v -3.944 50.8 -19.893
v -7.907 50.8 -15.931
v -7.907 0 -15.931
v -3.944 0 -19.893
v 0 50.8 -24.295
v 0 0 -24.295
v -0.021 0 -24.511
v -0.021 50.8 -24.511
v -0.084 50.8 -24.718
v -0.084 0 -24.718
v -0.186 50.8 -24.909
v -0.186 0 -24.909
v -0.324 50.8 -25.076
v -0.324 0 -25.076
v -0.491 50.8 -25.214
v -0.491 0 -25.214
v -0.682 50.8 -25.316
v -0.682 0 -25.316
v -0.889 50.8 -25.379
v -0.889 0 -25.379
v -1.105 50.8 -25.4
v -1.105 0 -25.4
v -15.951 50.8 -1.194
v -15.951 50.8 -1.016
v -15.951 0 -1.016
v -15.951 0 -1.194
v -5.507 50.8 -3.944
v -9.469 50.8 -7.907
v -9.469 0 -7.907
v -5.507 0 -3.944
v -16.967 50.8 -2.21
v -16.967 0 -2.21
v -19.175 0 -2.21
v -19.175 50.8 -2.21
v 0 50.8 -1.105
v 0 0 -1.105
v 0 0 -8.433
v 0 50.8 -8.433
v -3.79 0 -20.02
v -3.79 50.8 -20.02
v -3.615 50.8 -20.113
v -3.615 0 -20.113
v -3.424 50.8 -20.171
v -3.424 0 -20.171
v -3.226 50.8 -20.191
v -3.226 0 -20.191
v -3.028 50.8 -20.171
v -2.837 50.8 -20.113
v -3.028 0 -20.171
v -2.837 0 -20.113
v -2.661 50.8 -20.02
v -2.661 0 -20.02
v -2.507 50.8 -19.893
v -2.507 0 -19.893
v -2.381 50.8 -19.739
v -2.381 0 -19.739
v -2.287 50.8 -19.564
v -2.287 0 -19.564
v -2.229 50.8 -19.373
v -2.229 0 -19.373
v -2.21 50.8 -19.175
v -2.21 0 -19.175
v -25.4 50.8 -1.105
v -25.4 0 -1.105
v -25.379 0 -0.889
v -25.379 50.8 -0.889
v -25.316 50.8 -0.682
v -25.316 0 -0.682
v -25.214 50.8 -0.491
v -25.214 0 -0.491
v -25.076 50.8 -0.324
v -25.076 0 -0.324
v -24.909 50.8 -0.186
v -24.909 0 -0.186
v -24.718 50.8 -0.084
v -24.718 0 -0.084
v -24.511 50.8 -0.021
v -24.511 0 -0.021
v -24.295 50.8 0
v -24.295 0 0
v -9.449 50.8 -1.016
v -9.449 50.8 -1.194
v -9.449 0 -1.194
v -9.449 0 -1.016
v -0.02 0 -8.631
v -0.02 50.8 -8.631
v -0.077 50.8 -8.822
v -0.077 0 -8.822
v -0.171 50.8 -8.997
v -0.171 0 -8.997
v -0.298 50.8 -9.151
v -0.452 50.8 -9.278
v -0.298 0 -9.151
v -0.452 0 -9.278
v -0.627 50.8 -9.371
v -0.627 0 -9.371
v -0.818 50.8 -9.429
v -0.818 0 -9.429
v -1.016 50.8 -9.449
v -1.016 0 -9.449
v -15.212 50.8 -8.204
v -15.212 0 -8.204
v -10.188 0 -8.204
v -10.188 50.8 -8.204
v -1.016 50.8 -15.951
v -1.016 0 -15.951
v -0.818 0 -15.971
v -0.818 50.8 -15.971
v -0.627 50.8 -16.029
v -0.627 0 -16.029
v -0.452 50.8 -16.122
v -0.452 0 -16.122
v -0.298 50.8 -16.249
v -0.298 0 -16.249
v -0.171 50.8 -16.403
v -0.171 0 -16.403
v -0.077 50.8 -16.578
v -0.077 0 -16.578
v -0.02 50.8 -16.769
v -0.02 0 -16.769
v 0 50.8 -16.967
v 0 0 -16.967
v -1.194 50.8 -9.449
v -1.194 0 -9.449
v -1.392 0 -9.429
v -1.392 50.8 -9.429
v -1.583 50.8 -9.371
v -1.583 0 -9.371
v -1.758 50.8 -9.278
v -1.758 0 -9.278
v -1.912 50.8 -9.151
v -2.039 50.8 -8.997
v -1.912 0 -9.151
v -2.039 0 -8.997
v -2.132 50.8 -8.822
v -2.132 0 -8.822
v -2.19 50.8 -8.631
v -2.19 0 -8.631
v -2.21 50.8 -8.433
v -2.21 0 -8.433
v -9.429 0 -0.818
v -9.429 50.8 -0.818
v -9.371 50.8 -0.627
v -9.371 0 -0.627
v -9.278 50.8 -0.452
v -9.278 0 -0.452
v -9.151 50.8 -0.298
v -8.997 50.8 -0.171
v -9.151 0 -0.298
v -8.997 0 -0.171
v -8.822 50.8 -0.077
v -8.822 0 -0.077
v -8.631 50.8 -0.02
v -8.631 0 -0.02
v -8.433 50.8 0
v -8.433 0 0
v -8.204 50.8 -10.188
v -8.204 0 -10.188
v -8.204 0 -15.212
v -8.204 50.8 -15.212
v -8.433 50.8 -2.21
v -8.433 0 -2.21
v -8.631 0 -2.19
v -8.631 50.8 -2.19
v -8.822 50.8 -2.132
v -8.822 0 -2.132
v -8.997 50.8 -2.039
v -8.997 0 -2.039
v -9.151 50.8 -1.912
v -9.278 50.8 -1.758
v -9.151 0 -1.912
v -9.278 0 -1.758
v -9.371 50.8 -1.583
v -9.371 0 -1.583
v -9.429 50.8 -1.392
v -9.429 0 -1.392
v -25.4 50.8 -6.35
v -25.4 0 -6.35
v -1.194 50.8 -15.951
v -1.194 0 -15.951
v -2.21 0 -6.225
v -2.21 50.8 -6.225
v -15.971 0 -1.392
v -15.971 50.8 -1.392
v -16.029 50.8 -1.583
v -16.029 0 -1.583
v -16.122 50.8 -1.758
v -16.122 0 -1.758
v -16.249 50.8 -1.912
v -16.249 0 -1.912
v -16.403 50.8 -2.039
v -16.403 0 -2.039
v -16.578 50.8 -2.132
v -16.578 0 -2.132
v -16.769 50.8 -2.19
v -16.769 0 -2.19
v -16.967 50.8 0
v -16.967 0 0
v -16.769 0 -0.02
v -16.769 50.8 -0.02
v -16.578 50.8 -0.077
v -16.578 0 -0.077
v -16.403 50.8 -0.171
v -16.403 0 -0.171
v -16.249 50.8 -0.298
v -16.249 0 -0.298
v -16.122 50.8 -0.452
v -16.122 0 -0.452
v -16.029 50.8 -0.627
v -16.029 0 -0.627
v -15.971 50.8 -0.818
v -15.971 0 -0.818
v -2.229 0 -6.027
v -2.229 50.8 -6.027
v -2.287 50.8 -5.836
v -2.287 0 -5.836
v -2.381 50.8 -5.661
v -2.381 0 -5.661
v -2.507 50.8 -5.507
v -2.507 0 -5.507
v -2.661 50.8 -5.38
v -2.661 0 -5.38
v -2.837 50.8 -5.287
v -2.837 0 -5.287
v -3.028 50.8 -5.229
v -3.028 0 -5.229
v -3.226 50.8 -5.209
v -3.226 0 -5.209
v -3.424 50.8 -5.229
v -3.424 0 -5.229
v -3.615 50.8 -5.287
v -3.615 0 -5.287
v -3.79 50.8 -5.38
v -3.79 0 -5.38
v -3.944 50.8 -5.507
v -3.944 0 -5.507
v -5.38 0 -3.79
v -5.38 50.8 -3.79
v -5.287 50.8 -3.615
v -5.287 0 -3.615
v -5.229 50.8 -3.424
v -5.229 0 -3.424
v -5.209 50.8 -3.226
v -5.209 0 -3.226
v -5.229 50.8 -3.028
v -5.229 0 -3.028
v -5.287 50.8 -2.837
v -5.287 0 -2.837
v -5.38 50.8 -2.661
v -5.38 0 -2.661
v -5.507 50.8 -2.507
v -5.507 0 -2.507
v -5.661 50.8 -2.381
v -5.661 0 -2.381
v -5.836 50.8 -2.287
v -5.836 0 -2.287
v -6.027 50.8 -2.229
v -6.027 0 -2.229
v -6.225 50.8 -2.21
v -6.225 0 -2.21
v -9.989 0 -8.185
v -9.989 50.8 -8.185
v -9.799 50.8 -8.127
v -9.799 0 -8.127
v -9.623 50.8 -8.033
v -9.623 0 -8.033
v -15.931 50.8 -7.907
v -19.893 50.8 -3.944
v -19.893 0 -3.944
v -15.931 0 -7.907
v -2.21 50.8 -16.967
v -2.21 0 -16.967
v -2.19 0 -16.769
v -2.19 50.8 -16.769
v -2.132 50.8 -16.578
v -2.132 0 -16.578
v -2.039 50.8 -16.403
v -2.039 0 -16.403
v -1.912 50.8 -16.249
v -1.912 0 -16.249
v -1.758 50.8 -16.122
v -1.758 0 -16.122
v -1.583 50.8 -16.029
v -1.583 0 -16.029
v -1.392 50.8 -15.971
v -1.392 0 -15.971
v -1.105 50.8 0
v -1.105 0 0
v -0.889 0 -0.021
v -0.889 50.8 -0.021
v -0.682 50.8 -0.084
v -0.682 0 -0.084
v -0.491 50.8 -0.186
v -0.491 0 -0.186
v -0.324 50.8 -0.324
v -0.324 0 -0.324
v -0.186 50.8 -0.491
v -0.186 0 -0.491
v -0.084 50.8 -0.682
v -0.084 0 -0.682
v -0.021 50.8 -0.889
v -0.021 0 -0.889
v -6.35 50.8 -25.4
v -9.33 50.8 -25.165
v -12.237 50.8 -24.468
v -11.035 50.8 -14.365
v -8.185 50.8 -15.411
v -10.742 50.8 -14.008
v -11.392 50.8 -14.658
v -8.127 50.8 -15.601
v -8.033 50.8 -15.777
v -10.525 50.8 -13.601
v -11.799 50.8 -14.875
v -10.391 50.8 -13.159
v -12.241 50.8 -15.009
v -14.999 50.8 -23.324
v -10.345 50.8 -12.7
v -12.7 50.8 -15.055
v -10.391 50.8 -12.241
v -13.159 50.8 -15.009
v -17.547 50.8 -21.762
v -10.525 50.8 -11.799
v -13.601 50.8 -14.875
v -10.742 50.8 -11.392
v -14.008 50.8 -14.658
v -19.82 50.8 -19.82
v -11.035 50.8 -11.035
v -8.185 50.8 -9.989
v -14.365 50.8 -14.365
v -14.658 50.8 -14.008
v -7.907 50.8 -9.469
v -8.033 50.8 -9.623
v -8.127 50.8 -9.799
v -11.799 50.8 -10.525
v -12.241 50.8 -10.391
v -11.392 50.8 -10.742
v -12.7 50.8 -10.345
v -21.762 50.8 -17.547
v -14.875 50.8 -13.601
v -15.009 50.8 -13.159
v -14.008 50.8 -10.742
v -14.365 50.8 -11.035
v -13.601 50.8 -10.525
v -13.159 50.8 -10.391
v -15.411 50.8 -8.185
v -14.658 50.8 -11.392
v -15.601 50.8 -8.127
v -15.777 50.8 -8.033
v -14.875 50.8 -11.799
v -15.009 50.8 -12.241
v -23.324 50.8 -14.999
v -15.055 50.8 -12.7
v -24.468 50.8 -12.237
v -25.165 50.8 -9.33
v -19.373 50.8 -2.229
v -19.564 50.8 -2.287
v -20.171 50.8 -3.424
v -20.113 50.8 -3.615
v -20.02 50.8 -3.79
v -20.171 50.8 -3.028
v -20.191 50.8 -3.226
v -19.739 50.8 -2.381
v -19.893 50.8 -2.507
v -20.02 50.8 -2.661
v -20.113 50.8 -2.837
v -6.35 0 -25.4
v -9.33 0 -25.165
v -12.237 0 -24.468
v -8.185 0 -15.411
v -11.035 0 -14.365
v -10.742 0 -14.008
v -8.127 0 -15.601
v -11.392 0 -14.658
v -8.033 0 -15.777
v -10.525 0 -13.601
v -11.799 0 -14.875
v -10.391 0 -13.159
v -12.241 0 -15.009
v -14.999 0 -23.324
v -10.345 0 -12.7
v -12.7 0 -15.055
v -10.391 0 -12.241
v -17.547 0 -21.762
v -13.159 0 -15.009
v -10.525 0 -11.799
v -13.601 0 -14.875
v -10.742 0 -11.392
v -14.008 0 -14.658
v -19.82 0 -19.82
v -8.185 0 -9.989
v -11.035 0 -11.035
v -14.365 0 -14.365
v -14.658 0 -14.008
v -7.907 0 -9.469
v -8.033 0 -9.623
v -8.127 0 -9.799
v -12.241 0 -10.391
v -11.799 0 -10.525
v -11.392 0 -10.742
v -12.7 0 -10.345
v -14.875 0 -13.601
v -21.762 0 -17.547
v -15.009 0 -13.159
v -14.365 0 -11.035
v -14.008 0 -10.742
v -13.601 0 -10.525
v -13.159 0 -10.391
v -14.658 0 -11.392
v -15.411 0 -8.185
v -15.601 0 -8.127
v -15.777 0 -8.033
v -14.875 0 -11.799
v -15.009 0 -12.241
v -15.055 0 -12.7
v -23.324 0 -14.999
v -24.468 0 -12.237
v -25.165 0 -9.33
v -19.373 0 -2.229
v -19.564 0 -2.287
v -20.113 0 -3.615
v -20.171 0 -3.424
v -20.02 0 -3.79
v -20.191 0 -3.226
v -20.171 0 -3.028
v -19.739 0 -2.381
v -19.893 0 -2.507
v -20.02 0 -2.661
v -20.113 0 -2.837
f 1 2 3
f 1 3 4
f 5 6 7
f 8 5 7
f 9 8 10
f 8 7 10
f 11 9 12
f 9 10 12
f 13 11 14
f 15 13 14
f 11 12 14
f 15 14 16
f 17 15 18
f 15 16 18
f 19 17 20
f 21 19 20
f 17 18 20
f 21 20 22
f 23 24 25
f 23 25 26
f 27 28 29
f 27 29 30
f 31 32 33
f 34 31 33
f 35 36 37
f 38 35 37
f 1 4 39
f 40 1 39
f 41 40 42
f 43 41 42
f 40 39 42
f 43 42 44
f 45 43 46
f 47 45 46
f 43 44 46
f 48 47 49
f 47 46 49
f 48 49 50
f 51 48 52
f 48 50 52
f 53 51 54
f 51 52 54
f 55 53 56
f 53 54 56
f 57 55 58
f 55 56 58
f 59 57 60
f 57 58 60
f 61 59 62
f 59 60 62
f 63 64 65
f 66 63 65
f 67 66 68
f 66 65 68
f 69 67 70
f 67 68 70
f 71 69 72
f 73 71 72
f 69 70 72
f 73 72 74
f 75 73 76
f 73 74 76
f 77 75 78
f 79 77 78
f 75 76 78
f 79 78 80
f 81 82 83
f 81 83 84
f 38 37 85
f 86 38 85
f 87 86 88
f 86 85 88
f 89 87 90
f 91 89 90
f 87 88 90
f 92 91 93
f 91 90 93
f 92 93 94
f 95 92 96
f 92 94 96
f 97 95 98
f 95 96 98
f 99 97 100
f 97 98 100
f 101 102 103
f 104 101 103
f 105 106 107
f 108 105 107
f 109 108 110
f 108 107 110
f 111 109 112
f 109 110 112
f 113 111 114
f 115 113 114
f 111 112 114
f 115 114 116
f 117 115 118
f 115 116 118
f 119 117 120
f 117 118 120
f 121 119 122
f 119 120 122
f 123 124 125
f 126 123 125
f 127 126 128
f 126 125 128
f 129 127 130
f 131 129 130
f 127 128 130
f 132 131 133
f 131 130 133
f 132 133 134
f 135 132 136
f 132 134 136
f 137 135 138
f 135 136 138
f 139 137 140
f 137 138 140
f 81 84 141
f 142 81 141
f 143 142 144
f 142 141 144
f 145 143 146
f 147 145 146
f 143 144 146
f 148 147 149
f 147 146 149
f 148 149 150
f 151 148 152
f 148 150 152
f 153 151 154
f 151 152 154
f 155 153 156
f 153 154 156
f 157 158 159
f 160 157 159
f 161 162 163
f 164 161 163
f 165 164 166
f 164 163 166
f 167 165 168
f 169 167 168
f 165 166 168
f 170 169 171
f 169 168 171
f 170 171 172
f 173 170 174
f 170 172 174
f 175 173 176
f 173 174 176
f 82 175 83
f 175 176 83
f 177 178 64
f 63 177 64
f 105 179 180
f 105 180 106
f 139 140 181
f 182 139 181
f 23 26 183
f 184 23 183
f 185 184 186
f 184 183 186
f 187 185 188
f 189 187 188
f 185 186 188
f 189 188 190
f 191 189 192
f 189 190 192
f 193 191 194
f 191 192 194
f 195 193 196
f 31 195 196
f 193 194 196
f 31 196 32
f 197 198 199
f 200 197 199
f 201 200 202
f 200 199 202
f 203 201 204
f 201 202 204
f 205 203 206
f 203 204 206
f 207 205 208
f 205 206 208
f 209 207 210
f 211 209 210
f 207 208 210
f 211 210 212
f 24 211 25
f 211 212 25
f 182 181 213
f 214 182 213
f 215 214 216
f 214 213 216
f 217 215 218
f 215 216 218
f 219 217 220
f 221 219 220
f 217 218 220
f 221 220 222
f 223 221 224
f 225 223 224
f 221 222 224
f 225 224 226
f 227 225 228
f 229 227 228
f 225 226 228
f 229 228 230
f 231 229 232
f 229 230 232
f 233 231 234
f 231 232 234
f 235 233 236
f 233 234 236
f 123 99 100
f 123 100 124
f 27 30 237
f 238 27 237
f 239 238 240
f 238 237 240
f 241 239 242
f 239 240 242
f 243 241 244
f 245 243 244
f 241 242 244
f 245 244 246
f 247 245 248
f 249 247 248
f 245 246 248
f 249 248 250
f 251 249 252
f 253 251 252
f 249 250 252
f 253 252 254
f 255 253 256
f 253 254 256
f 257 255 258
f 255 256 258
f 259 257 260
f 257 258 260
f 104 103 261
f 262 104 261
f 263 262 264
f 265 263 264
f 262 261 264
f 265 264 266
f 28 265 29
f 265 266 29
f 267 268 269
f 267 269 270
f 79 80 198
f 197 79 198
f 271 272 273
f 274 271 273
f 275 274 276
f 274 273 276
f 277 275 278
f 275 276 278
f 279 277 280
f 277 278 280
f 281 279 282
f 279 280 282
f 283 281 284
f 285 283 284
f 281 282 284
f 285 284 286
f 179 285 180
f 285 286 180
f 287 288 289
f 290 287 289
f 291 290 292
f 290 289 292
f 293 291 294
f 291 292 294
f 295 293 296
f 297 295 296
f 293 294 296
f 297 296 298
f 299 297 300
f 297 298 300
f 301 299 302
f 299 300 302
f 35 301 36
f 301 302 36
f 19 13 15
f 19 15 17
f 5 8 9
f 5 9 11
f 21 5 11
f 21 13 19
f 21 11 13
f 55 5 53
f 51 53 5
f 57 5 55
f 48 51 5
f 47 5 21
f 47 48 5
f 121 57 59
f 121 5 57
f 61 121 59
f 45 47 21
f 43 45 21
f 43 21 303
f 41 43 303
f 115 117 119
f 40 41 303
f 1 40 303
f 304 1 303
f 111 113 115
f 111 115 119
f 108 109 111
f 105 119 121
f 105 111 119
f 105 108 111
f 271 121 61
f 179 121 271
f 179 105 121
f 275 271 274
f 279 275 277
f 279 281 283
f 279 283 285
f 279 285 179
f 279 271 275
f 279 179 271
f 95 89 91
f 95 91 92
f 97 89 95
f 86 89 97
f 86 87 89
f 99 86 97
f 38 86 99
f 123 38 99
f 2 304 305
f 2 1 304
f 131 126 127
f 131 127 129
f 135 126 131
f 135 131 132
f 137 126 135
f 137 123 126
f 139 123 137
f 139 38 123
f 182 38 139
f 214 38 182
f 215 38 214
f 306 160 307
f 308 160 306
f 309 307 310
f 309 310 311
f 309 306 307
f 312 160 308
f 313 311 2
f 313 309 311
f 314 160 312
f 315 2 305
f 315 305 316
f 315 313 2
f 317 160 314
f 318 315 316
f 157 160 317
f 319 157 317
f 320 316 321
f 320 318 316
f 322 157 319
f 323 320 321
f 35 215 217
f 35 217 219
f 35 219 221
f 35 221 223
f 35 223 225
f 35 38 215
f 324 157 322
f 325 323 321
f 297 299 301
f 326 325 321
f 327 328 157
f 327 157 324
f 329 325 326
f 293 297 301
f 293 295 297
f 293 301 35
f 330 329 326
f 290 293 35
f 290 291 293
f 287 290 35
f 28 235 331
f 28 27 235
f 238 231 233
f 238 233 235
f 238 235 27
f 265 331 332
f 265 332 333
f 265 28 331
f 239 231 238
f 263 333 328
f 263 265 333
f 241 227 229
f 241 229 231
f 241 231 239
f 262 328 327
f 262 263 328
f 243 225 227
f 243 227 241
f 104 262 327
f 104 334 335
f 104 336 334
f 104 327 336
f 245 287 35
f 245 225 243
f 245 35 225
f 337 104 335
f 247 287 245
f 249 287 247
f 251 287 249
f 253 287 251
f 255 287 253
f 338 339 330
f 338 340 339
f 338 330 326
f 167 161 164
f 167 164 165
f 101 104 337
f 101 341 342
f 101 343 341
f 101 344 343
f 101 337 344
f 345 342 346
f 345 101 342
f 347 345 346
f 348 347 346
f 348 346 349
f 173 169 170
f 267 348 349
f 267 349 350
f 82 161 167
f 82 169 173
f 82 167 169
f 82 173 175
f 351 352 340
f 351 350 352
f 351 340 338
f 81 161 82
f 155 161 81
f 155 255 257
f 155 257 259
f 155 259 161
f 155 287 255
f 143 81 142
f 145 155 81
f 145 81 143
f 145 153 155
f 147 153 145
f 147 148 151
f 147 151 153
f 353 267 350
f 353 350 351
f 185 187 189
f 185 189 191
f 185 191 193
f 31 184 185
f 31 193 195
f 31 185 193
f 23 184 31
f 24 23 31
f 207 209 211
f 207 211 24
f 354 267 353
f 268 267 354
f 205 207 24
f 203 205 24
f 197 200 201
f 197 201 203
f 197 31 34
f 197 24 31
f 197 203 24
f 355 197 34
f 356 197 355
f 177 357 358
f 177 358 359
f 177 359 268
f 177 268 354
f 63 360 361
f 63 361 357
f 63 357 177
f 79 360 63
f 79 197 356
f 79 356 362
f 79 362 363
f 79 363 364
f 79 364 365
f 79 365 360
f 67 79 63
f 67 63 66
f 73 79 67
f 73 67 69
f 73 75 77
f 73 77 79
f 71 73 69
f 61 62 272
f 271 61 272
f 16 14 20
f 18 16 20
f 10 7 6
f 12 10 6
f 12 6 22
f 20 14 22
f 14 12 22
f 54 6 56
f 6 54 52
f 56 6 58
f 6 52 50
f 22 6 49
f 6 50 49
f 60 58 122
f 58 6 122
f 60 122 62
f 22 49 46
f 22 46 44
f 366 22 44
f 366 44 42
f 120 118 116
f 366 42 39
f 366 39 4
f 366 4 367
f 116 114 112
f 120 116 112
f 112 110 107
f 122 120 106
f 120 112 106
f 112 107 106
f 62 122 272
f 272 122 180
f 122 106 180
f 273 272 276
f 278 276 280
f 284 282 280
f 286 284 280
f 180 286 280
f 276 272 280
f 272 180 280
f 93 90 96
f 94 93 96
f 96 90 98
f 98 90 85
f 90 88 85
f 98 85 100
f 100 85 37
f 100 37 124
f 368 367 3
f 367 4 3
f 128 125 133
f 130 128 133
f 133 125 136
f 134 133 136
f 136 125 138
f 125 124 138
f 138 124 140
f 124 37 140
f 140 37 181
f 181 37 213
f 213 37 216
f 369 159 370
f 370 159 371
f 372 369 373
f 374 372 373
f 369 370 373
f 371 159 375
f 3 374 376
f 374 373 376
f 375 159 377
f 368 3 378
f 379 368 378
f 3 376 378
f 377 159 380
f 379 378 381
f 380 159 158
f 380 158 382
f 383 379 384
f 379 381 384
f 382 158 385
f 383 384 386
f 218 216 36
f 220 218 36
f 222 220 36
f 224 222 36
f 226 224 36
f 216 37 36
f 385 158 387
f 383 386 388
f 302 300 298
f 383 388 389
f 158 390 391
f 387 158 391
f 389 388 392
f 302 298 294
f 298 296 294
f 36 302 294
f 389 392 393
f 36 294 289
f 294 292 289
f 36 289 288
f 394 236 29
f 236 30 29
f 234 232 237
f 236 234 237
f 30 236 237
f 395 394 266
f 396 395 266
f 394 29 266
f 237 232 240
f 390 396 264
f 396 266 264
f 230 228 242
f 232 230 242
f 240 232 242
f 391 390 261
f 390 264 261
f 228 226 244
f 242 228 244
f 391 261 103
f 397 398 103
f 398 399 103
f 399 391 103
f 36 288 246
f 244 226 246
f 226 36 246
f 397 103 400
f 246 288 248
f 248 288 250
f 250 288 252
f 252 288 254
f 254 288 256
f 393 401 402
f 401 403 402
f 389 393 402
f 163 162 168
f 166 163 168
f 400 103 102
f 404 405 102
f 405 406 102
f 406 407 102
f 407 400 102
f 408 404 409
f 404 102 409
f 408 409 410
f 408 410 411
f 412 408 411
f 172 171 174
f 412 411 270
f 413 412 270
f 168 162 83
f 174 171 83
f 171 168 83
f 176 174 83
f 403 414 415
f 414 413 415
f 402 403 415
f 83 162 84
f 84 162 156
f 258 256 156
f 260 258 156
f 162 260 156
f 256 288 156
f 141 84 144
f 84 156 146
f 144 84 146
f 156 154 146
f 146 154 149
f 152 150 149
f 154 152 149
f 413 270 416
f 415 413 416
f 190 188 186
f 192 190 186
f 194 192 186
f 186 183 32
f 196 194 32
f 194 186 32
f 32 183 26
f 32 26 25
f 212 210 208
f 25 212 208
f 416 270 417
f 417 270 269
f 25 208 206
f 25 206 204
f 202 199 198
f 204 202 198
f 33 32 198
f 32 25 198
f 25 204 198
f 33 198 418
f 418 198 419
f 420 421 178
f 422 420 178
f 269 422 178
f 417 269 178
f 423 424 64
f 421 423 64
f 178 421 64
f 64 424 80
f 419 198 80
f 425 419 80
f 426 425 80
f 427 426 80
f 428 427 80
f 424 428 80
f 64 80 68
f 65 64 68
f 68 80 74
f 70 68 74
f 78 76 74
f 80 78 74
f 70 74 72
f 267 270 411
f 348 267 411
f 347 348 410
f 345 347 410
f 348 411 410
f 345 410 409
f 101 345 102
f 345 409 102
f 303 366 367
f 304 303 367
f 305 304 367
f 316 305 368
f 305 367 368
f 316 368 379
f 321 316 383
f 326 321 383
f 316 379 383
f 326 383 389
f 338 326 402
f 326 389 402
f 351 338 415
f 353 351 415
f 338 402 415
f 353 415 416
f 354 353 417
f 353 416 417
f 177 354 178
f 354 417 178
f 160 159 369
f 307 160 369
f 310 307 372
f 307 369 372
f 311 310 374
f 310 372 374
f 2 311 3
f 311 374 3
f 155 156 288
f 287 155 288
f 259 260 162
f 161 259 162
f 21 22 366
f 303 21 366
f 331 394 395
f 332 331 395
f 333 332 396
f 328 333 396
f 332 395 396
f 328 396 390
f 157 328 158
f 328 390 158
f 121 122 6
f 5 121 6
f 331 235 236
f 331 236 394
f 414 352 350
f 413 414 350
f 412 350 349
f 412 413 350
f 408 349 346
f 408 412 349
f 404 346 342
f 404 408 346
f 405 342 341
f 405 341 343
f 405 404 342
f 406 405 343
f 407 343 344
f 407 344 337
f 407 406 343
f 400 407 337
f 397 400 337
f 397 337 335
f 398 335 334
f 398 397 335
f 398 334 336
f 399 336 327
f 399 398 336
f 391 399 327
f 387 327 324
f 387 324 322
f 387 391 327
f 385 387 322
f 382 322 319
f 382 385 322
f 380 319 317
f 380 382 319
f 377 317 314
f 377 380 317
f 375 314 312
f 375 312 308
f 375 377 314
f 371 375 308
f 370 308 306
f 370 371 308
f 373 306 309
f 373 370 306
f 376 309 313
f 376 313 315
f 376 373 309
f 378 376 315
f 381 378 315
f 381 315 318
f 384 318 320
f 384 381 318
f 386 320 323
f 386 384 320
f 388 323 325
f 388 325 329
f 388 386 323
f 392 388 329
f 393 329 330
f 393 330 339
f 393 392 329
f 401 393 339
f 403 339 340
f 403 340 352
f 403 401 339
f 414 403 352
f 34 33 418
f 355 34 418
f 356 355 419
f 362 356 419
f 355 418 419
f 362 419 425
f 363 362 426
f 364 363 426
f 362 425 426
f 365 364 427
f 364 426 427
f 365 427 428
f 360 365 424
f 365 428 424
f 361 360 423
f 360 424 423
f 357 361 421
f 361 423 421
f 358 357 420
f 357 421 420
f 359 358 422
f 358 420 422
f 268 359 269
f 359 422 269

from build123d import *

# Parameters (mm, degrees)
SKETCH11_R               = 2.354570308
MEMBER_10_1012_S_1_DEPTH = 50.8


with BuildPart() as part:
    # Sketch11 → Member 10 1012-S_1 (new body)
    with BuildSketch(Plane(origin=(0, 0, 0), x_dir=(-1, 0, 0), z_dir=(0, 1, 0))):
        with BuildLine():
            Line((24.2951, 0), (16.9672, 0))
            ThreePointArc((16.9672, 0), (16.24877951, -0.29757951), (15.9512, -1.016))
            Line((15.9512, -1.016), (15.9512, -1.1938))
            ThreePointArc((15.9512, -1.1938), (16.24877951, -1.91222049), (16.9672, -2.2098))
            Line((16.9672, -2.2098), (19.174794456, -2.2098))
            ThreePointArc((19.174794456, -2.2098), (20.113456061, -2.836993633), (19.893214945, -3.94422049))
            Line((19.893214945, -3.94422049), (15.930814945, -7.90662049))
            ThreePointArc((15.930814945, -7.90662049), (15.601200823, -8.126861605), (15.212394456, -8.2042))
            Line((15.212394456, -8.2042), (10.187605544, -8.2042))
            ThreePointArc((10.187605544, -8.2042), (9.798799177, -8.126861605), (9.469185055, -7.90662049))
            Line((9.469185055, -7.90662049), (5.506785055, -3.94422049))
            ThreePointArc((5.506785055, -3.94422049), (5.286543939, -2.836993633), (6.225205544, -2.2098))
            Line((6.225205544, -2.2098), (8.4328, -2.2098))
            ThreePointArc((8.4328, -2.2098), (9.15122049, -1.91222049), (9.4488, -1.1938))
            Line((9.4488, -1.1938), (9.4488, -1.016))
            ThreePointArc((9.4488, -1.016), (9.15122049, -0.29757951), (8.4328, 0))
            Line((8.4328, 0), (1.1049, 0))
            ThreePointArc((1.1049, 0), (0.323617717, -0.323617717), (0, -1.1049))
            Line((0, -1.1049), (0, -8.4328))
            ThreePointArc((0, -8.4328), (0.29757951, -9.15122049), (1.016, -9.4488))
            Line((1.016, -9.4488), (1.1938, -9.4488))
            ThreePointArc((1.1938, -9.4488), (1.91222049, -9.15122049), (2.2098, -8.4328))
            Line((2.2098, -8.4328), (2.2098, -6.225205544))
            ThreePointArc((2.2098, -6.225205544), (2.836993633, -5.286543939), (3.94422049, -5.506785055))
            Line((3.94422049, -5.506785055), (7.90662049, -9.469185055))
            ThreePointArc((7.90662049, -9.469185055), (8.126861605, -9.798799177), (8.2042, -10.187605544))
            Line((8.2042, -10.187605544), (8.2042, -15.212394456))
            ThreePointArc((8.2042, -15.212394456), (8.126861605, -15.601200823), (7.90662049, -15.930814945))
            Line((7.90662049, -15.930814945), (3.94422049, -19.893214945))
            ThreePointArc((3.94422049, -19.893214945), (2.836993633, -20.113456061), (2.2098, -19.174794456))
            Line((2.2098, -19.174794456), (2.2098, -16.9672))
            ThreePointArc((2.2098, -16.9672), (1.91222049, -16.24877951), (1.1938, -15.9512))
            Line((1.1938, -15.9512), (1.016, -15.9512))
            ThreePointArc((1.016, -15.9512), (0.29757951, -16.24877951), (0, -16.9672))
            Line((0, -16.9672), (0, -24.2951))
            ThreePointArc((0, -24.2951), (0.323617717, -25.076382283), (1.1049, -25.4))
            Line((1.1049, -25.4), (6.35, -25.4))
            ThreePointArc((6.35, -25.4), (19.820384182, -19.820384182), (25.4, -6.35))
            Line((25.4, -6.35), (25.4, -1.1049))
            ThreePointArc((25.4, -1.1049), (25.076382283, -0.323617717), (24.2951, 0))
        make_face()
        with Locations((12.7, -12.7)):
            Circle(SKETCH11_R, mode=Mode.SUBTRACT)
    extrude(amount=MEMBER_10_1012_S_1_DEPTH)


solid = part.part
